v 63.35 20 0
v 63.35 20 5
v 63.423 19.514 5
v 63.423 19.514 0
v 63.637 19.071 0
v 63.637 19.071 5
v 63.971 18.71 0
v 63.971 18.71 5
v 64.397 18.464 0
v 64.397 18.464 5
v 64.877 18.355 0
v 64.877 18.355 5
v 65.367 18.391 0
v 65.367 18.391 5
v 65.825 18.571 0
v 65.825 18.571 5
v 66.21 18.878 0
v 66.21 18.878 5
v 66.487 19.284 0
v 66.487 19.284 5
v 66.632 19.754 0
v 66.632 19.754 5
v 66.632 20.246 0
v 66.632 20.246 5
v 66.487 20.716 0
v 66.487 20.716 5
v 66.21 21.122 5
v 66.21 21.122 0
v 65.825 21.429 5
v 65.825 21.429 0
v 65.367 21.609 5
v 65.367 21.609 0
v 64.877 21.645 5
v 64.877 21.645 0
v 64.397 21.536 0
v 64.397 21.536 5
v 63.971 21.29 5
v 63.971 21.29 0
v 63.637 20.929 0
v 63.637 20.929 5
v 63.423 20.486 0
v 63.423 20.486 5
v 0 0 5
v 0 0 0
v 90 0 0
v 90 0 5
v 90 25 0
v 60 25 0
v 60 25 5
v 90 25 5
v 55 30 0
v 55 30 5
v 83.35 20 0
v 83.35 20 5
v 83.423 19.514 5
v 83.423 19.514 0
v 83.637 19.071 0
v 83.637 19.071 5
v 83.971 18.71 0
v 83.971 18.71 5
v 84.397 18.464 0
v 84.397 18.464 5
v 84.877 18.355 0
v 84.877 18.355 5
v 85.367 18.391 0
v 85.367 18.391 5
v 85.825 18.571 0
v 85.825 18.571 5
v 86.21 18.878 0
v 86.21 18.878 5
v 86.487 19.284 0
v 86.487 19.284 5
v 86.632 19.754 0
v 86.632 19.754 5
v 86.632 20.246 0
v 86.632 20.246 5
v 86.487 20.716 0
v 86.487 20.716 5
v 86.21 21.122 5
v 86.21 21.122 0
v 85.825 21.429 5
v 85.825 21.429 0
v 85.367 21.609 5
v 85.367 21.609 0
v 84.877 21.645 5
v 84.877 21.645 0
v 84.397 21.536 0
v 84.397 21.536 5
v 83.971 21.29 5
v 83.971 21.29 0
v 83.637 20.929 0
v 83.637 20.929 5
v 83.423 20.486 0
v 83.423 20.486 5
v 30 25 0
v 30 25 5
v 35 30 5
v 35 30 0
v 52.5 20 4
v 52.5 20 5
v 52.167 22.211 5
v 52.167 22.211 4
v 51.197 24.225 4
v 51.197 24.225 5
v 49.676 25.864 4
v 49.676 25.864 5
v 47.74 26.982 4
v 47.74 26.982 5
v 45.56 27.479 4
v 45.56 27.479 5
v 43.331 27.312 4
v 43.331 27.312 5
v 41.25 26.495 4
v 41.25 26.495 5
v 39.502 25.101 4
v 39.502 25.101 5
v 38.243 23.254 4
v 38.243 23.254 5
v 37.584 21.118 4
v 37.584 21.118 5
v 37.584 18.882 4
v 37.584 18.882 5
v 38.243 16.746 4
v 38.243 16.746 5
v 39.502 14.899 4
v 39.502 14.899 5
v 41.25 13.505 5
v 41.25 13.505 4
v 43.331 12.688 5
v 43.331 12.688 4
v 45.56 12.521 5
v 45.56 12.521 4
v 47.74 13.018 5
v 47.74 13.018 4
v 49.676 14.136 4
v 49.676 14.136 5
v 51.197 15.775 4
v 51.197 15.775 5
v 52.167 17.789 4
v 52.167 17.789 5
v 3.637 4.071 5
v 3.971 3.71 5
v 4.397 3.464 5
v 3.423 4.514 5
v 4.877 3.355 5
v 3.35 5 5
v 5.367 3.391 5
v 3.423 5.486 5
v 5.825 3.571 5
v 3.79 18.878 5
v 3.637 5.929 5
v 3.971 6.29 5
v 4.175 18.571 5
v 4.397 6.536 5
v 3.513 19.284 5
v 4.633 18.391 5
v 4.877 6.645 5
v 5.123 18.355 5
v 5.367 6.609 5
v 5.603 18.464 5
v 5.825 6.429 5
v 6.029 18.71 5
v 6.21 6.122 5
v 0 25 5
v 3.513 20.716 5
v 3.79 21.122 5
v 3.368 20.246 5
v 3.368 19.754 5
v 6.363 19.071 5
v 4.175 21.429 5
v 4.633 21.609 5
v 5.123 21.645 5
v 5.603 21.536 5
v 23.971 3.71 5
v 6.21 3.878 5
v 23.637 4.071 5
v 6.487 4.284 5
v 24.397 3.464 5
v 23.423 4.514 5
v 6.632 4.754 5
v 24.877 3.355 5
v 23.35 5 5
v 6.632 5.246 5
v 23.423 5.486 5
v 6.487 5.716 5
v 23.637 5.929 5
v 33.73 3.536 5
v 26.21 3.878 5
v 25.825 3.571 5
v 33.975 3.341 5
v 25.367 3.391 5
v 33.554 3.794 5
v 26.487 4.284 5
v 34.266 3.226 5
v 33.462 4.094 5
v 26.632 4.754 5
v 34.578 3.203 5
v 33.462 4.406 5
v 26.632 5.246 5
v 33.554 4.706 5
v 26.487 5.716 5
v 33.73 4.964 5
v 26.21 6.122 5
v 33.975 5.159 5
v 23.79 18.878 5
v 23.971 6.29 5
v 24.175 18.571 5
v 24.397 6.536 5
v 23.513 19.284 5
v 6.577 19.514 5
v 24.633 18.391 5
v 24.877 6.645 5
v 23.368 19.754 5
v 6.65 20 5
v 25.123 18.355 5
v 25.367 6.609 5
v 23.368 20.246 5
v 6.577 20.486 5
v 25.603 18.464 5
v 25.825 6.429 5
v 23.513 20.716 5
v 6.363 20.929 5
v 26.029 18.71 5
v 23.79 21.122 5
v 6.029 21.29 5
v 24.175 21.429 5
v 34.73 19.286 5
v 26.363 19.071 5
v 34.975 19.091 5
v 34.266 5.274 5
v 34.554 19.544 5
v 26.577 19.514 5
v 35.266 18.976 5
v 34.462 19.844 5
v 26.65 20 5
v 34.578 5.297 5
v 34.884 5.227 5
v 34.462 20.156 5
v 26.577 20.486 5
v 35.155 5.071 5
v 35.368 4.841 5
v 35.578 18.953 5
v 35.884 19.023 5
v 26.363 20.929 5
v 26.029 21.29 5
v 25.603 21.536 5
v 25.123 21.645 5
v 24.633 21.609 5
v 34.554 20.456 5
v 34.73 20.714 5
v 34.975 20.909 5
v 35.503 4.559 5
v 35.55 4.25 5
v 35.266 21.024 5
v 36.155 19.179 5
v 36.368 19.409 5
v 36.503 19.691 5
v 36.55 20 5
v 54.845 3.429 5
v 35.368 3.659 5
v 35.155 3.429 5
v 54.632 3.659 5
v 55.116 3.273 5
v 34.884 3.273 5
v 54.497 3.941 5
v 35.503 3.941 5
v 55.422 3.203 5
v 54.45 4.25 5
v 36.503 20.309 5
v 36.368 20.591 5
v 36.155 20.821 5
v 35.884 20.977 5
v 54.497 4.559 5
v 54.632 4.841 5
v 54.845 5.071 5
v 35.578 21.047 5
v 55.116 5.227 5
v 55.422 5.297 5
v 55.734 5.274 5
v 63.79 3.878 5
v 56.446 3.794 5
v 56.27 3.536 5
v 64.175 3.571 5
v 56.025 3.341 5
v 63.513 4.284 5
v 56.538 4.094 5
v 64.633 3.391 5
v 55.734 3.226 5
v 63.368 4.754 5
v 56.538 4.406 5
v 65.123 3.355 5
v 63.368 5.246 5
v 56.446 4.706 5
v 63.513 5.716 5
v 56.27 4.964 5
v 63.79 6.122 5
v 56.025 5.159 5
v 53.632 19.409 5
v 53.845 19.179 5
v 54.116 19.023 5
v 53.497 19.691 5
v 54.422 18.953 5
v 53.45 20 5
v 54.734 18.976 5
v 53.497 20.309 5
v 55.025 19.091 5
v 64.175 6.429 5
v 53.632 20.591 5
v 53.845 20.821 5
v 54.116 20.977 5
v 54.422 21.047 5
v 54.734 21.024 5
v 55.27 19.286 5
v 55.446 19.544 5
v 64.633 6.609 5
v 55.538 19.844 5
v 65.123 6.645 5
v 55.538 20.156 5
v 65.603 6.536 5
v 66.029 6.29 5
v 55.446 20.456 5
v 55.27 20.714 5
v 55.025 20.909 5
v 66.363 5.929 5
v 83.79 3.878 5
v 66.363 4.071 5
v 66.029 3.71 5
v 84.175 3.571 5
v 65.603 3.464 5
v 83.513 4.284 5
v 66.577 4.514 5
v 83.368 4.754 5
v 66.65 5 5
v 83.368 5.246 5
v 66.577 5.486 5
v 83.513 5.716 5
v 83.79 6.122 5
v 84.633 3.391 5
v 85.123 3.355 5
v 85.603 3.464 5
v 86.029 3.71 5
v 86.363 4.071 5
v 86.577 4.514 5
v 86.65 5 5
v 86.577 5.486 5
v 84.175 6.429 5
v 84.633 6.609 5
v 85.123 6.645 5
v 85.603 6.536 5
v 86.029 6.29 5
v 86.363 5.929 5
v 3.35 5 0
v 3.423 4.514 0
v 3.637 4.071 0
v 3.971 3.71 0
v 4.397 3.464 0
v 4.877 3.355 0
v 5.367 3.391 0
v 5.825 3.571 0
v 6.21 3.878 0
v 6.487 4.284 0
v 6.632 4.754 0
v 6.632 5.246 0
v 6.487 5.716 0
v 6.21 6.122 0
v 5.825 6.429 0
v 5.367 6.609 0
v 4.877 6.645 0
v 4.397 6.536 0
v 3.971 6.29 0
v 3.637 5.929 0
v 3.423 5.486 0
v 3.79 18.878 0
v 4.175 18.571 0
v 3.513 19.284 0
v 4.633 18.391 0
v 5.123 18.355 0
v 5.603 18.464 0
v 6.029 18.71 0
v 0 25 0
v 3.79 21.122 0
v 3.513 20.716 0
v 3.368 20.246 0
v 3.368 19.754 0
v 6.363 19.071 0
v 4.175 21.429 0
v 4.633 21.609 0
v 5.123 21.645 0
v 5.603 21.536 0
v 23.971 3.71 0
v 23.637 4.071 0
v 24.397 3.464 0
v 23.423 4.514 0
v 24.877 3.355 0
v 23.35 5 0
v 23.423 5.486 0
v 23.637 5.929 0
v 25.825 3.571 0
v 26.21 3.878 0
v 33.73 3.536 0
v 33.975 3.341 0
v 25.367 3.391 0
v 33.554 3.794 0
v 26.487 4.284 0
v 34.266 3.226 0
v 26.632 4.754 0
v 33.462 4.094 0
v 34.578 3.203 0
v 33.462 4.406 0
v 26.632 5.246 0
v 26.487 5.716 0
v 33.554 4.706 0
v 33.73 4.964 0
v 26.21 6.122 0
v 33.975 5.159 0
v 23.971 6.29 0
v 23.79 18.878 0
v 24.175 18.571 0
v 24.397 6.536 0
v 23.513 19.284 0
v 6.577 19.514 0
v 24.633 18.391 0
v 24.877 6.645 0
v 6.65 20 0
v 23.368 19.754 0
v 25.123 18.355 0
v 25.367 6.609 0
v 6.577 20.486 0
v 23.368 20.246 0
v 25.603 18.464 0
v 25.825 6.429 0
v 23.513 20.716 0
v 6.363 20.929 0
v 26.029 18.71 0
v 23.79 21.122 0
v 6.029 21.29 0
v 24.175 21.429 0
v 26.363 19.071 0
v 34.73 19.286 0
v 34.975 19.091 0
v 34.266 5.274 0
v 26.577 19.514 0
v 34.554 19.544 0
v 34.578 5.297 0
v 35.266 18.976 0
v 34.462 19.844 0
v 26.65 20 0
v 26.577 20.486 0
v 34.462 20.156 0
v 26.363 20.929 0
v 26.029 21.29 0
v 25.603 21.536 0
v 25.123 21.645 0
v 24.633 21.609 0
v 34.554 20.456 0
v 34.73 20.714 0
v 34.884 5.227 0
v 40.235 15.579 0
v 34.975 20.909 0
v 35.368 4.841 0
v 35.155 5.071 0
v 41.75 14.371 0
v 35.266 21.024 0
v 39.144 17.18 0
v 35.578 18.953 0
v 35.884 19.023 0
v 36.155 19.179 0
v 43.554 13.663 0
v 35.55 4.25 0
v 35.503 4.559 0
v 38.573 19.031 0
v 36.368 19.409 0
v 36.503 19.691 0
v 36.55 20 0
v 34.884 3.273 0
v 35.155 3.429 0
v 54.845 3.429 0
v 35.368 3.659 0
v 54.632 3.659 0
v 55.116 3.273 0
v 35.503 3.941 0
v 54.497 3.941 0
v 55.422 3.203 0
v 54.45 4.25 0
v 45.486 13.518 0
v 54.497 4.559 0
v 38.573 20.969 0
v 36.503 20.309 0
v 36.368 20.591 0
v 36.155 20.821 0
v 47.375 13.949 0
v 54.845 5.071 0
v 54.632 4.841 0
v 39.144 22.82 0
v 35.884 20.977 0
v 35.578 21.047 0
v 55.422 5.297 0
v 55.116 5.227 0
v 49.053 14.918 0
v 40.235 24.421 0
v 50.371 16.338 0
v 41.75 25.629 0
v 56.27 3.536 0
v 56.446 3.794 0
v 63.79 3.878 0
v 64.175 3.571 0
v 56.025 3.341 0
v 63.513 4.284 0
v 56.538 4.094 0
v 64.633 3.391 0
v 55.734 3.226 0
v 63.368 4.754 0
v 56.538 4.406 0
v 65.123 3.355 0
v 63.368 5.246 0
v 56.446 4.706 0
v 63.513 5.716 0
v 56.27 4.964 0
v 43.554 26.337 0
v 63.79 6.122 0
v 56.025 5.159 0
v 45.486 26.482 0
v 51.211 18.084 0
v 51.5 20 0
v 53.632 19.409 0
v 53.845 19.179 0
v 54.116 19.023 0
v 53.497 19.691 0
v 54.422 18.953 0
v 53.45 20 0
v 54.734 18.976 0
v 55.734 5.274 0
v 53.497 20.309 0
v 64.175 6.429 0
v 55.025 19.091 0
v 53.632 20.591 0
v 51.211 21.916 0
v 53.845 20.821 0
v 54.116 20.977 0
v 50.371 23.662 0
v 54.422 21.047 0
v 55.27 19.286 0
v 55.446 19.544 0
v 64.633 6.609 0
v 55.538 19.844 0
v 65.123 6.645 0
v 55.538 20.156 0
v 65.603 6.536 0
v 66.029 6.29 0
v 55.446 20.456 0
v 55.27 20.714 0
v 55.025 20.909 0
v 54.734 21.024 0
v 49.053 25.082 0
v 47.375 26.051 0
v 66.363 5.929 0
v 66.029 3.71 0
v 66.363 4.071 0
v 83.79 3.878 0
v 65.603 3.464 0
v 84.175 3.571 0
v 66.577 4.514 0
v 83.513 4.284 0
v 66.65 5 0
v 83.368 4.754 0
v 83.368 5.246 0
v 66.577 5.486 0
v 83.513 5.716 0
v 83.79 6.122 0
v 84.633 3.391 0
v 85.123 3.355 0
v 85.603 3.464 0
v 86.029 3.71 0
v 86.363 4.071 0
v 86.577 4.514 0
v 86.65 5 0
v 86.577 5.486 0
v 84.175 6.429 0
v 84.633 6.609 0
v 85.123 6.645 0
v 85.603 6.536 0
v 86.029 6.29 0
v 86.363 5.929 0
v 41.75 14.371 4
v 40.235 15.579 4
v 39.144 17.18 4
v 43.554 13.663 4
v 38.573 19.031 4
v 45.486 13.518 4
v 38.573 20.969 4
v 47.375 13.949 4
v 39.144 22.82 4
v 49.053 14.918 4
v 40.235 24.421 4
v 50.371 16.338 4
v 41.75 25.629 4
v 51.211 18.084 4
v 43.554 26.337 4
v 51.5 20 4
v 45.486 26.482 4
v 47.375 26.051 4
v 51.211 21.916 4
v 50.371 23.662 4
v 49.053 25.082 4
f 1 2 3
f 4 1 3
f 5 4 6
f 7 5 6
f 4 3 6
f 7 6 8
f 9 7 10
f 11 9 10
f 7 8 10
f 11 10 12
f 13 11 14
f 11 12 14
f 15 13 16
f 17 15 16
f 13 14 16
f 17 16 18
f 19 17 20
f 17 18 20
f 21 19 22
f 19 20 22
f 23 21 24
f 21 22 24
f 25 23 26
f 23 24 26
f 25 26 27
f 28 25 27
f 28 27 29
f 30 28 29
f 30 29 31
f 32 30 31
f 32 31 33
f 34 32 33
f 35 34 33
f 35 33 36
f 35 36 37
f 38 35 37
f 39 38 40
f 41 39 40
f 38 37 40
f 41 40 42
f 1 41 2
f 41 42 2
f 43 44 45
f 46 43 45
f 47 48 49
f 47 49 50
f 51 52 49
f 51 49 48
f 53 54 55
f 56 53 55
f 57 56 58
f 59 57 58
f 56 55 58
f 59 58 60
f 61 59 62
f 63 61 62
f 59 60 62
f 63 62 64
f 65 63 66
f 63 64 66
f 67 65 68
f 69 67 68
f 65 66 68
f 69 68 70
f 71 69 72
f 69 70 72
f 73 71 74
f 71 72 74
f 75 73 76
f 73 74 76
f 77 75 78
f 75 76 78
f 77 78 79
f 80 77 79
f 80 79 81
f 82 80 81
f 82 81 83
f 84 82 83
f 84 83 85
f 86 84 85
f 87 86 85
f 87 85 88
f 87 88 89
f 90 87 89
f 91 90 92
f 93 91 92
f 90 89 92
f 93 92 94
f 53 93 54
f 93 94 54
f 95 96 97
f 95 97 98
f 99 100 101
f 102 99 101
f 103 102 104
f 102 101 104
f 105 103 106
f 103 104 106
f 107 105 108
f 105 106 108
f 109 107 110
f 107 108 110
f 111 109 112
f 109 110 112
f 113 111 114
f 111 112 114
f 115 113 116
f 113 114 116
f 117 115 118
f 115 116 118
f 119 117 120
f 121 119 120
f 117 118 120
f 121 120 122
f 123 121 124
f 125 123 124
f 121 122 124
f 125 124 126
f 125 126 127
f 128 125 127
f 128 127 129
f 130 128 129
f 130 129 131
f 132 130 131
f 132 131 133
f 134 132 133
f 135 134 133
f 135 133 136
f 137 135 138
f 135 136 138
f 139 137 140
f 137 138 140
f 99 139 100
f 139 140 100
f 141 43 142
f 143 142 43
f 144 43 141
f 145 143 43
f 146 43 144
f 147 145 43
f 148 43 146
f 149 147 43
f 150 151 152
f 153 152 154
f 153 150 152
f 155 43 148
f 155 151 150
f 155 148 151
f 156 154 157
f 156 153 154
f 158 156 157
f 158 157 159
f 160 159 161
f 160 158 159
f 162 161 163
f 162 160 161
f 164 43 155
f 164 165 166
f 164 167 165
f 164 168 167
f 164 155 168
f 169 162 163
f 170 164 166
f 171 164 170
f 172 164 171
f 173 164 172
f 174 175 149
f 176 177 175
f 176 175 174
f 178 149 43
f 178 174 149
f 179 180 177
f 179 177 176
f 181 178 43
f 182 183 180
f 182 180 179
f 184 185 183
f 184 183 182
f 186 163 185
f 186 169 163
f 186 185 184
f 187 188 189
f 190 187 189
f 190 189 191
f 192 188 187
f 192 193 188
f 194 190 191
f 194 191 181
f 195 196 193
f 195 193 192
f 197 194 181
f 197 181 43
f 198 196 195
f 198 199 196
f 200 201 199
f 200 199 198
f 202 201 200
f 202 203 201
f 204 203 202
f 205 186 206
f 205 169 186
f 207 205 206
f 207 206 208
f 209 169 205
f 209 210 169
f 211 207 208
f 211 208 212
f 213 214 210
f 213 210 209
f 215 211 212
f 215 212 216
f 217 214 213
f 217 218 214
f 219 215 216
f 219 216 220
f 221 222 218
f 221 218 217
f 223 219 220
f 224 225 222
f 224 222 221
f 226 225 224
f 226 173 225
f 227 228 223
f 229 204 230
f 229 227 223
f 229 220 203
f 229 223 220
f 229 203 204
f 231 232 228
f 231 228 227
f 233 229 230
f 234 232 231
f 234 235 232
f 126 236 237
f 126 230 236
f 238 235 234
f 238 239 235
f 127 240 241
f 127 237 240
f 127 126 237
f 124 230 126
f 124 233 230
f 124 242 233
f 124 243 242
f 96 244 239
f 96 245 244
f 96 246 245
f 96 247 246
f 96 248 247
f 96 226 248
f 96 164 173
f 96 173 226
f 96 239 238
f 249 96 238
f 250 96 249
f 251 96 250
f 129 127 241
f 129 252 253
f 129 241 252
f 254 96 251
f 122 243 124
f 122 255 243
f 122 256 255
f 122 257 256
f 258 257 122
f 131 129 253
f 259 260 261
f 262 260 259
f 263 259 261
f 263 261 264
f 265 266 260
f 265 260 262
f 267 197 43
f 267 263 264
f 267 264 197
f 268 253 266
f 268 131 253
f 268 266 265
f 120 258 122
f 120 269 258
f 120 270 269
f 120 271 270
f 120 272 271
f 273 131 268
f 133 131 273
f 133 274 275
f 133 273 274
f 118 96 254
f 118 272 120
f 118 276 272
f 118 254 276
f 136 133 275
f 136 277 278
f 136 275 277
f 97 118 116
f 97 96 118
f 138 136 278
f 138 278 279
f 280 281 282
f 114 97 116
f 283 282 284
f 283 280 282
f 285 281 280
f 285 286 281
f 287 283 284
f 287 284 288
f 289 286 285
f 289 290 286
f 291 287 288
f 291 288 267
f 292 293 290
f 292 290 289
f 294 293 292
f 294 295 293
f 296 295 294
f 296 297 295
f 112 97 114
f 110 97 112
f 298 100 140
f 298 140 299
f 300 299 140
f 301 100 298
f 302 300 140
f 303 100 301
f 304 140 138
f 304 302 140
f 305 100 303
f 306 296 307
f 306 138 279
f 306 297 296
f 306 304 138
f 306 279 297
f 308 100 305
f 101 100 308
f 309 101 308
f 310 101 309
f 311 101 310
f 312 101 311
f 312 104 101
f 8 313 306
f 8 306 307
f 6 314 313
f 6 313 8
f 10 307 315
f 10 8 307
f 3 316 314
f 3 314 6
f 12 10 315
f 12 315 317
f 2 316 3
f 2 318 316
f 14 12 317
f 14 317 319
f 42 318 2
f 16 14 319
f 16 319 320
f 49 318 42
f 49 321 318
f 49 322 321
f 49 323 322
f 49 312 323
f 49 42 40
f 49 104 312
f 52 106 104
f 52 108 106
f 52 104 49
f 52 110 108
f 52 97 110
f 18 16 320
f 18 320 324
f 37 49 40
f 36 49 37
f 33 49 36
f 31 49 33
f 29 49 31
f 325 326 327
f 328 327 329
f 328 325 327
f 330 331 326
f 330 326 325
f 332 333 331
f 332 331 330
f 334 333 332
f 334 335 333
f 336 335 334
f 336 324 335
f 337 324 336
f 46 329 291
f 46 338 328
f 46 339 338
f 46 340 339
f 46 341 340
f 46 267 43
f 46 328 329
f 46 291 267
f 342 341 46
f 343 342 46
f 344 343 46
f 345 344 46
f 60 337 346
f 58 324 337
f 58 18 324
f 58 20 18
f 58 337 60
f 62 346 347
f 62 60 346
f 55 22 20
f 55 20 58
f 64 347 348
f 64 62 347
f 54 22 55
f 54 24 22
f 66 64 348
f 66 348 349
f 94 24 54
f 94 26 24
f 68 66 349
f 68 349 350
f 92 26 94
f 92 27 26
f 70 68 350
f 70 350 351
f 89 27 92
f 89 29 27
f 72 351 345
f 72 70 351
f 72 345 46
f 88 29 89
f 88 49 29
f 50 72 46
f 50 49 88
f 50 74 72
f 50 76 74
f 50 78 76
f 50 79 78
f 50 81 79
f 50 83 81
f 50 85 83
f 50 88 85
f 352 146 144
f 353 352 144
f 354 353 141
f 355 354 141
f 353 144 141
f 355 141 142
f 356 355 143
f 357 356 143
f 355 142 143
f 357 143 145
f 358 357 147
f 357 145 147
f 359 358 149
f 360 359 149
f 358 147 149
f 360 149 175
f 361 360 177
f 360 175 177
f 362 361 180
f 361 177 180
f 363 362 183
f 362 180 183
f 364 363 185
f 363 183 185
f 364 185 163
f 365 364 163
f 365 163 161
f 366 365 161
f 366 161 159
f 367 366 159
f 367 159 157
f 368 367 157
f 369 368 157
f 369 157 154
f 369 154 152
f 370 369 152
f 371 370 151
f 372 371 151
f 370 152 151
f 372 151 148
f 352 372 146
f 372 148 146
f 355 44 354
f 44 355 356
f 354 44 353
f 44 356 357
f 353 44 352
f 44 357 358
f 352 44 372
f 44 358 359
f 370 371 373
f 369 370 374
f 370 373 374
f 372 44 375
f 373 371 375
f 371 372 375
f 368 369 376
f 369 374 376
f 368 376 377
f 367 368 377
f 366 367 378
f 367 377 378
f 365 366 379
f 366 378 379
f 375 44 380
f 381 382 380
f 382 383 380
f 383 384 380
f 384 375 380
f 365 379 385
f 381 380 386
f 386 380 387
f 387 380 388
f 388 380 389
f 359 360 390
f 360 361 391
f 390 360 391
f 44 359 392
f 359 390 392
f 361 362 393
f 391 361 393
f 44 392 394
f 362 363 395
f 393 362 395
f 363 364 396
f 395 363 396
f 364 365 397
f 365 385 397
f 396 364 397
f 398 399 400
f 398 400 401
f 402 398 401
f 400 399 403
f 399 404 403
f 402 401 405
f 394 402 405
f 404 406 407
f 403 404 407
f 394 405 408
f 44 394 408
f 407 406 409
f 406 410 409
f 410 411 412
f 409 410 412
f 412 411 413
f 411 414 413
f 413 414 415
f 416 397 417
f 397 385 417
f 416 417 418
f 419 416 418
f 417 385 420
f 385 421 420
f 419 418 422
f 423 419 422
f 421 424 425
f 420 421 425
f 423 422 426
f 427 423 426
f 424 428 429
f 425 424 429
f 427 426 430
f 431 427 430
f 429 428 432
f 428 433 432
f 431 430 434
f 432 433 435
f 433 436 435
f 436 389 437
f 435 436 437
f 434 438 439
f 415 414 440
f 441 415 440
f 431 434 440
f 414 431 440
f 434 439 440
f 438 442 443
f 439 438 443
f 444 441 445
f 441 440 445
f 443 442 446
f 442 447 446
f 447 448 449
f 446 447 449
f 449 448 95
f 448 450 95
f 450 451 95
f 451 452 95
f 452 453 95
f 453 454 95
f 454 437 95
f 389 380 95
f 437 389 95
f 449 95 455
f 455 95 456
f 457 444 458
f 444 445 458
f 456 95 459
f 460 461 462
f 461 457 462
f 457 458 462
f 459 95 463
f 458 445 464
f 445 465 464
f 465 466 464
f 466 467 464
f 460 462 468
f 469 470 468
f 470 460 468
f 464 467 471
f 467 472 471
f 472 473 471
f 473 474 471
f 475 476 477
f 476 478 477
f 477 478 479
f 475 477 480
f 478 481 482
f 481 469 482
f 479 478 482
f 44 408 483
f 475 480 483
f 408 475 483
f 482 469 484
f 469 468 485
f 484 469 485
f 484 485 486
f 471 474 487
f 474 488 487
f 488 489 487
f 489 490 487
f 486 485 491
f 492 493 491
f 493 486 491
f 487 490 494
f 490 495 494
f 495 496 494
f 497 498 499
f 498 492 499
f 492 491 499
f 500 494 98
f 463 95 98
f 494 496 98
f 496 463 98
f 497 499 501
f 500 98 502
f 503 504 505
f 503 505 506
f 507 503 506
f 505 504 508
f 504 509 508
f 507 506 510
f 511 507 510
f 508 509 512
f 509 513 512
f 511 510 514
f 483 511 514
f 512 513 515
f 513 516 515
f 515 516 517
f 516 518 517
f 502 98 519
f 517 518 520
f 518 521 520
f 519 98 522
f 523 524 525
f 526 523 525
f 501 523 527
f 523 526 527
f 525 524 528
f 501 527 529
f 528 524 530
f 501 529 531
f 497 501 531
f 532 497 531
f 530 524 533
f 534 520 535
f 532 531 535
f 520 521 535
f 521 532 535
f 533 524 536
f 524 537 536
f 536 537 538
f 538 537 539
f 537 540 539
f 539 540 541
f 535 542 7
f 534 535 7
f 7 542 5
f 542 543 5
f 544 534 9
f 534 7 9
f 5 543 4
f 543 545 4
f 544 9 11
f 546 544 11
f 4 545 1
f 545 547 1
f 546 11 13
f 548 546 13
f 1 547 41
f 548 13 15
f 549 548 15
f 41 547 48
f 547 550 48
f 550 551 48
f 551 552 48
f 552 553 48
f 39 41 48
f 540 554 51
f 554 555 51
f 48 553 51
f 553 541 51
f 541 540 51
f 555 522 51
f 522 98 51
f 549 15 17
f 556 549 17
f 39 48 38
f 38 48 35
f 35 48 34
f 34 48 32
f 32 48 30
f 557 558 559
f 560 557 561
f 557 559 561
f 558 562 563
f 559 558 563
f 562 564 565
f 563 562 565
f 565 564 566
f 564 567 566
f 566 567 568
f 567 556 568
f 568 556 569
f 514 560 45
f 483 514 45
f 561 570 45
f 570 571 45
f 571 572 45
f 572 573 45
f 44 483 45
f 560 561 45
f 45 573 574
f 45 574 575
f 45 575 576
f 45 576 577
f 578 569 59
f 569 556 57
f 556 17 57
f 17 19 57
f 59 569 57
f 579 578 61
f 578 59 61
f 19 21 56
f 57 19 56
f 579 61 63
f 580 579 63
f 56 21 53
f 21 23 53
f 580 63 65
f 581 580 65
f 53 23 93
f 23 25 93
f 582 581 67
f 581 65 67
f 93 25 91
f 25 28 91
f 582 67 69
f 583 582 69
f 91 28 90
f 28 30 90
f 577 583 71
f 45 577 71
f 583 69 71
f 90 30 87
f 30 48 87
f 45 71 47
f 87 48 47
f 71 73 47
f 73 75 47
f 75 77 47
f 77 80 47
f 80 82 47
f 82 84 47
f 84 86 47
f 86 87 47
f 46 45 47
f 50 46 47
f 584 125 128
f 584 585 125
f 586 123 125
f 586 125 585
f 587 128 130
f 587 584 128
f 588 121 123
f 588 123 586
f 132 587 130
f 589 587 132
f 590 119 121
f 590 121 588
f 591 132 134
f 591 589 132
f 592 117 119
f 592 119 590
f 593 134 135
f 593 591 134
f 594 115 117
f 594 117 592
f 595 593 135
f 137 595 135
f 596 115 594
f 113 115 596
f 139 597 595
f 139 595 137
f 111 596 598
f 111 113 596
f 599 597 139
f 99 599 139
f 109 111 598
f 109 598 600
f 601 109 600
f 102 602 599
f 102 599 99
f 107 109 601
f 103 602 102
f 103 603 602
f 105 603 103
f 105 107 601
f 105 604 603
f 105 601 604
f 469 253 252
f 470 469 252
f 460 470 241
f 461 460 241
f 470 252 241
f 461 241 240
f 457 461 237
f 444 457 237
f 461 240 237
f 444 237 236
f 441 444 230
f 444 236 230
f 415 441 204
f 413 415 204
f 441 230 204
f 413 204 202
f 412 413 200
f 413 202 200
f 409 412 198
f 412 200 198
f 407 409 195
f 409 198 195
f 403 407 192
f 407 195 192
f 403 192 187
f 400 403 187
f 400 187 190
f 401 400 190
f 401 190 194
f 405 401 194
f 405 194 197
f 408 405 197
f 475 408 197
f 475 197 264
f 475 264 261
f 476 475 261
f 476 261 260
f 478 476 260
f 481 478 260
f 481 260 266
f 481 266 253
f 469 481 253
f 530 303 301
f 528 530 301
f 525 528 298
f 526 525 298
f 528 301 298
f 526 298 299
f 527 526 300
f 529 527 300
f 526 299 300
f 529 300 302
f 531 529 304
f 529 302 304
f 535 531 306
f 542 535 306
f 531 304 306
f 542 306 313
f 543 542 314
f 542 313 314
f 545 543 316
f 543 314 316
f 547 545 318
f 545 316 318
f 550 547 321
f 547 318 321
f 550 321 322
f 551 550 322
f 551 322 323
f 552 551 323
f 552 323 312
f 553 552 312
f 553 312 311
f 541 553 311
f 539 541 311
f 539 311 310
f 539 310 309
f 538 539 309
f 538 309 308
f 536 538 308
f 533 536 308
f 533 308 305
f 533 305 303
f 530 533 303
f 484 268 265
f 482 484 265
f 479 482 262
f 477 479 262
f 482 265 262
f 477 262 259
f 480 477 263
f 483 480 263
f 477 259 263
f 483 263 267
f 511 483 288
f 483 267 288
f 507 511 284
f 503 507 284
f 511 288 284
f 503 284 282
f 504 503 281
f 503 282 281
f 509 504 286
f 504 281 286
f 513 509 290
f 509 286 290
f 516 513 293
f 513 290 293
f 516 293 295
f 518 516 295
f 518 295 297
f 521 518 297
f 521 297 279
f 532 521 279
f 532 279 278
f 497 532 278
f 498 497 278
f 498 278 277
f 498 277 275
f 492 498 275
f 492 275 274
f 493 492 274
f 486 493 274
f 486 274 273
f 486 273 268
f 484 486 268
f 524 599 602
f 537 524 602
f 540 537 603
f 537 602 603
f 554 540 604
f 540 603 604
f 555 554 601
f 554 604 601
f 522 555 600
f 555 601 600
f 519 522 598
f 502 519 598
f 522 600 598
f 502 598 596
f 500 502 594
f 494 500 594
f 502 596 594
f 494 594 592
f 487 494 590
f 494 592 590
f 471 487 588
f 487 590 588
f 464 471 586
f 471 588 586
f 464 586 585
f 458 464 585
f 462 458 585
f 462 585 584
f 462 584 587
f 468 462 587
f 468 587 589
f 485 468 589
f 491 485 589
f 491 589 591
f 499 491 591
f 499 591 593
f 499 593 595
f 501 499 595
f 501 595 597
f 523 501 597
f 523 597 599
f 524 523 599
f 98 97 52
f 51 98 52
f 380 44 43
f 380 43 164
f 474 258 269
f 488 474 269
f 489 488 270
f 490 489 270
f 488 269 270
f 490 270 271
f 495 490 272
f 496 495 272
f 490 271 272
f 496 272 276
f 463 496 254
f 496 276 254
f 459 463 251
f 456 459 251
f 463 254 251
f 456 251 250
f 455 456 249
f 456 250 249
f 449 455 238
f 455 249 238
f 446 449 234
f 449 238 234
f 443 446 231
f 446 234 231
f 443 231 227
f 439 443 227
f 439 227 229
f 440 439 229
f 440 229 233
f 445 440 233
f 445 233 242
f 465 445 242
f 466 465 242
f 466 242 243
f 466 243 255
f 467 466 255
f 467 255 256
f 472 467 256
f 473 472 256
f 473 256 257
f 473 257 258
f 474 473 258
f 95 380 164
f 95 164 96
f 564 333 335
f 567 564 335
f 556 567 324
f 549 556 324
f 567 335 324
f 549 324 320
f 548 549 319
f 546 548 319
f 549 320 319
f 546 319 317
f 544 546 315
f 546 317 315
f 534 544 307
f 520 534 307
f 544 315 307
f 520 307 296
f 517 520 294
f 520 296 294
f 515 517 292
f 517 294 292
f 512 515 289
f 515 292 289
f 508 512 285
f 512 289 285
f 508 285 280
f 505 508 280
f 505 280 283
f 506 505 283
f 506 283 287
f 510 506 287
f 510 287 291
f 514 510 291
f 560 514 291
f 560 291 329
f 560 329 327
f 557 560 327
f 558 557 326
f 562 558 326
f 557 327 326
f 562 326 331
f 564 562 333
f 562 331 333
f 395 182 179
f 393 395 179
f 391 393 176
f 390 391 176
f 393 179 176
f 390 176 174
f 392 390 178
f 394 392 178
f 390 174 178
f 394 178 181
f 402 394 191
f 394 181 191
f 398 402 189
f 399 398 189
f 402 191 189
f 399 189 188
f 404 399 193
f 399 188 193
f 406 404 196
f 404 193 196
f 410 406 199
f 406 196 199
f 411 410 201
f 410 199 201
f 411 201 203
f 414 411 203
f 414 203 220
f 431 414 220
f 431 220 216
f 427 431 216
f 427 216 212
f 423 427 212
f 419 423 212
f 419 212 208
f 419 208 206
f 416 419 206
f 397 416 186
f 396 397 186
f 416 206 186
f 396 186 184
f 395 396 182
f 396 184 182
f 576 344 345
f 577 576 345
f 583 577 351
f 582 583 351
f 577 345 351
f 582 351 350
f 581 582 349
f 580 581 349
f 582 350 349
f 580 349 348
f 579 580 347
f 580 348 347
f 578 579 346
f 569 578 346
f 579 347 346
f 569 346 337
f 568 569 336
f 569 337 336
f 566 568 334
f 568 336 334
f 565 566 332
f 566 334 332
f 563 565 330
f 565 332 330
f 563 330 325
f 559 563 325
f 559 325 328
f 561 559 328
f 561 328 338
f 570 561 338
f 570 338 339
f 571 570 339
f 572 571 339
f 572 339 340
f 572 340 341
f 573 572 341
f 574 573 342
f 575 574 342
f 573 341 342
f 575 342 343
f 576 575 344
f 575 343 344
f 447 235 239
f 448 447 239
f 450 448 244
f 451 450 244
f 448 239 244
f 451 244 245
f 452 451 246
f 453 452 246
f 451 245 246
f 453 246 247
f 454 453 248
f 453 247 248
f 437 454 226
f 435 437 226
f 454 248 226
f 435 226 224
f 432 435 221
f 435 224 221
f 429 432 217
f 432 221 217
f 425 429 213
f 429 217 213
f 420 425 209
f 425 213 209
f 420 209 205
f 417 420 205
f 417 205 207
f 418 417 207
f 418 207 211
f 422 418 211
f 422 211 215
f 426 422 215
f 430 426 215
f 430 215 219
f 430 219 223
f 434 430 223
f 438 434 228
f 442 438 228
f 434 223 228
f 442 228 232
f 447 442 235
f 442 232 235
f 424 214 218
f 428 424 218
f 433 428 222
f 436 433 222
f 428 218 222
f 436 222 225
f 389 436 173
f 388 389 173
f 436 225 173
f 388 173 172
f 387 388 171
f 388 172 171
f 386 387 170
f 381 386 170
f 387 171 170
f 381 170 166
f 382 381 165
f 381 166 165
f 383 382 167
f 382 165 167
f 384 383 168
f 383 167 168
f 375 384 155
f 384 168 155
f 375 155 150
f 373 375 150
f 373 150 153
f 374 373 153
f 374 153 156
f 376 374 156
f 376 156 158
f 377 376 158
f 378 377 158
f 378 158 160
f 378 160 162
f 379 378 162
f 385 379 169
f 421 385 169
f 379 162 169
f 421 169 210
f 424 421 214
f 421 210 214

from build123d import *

# Parameters (mm, degrees)
ESQUISSE1_W             = 90
ESQUISSE1_H             = 25
BOSS_EXTRU_1_DEPTH      = 5
ESQUISSE6_W             = 20
ESQUISSE6_H             = 5
BOSS_EXTRU_2_DEPTH      = 5
ESQUISSE3_R             = 6.5
ENL_V_MAT_EXTRU_2_DEPTH = 96
ESQUISSE4_R             = 1.05
ENL_V_MAT_EXTRU_3_DEPTH = 96
ESQUISSE5_R             = 1.65
ENL_V_MAT_EXTRU_4_DEPTH = 5
CHANFREIN1_SIZE         = 5
ESQUISSE7_R             = 7.5
ENL_V_MAT_EXTRU_5_DEPTH = 1


with BuildPart() as part:
    # Esquisse1 → Boss.-Extru.1 (new body)
    with BuildSketch(Plane.XY):
        with Locations((45, 12.5)):
            Rectangle(ESQUISSE1_W, ESQUISSE1_H)
    extrude(amount=BOSS_EXTRU_1_DEPTH)

    # Esquisse6 → Boss.-Extru.2 (add)
    with BuildSketch(Plane.XY.offset(5)):
        with Locations((45, 27.5)):
            Rectangle(ESQUISSE6_W, ESQUISSE6_H)
    extrude(amount=-BOSS_EXTRU_2_DEPTH)

    # Esquisse3 → Enlèv. mat.-Extru.2 (cut, through all)
    with BuildSketch(Plane.XY.offset(5)):
        with Locations((45, 20)):
            Circle(ESQUISSE3_R)
    extrude(amount=-ENL_V_MAT_EXTRU_2_DEPTH, mode=Mode.SUBTRACT)

    # Esquisse4 → Enlèv. mat.-Extru.3 (cut, through all)
    with BuildSketch(Plane.XY.offset(5)):
        with Locations((34.5, 4.25)):
            Circle(ESQUISSE4_R)
        with Locations(Location((54.5, 20, 0), (0, 0, 180))):
            Circle(ESQUISSE4_R)
        with Locations(Location((55.5, 4.25, 0), (0, 0, 180))):
            Circle(ESQUISSE4_R)
        with Locations((35.5, 20)):
            Circle(ESQUISSE4_R)
    extrude(amount=-ENL_V_MAT_EXTRU_3_DEPTH, mode=Mode.SUBTRACT)

    # Esquisse5 → Enlèv. mat.-Extru.4 (cut)
    with BuildSketch(Plane.XY.offset(5)):
        with Locations((5, 20)):
            Circle(ESQUISSE5_R)
        with Locations((25, 20)):
            Circle(ESQUISSE5_R)
        with Locations(Location((25, 5, 0), (0, 0, 180))):
            Circle(ESQUISSE5_R)
        with Locations(Location((5, 5, 0), (0, 0, 180))):
            Circle(ESQUISSE5_R)
        with Locations((85, 5)):
            Circle(ESQUISSE5_R)
        with Locations((65, 5)):
            Circle(ESQUISSE5_R)
        with Locations(Location((65, 20, 0), (0, 0, 180))):
            Circle(ESQUISSE5_R)
        with Locations(Location((85, 20, 0), (0, 0, 180))):
            Circle(ESQUISSE5_R)
    extrude(amount=-ENL_V_MAT_EXTRU_4_DEPTH, mode=Mode.SUBTRACT)

    # Chanfrein1
    chanfrein1_edges = [part.edges().sort_by_distance(p)[0] for p in [
        (55, 25, 2.5),
        (35, 25, 2.5),
    ]]
    chamfer(chanfrein1_edges, length=CHANFREIN1_SIZE - 0.0001)  # a hair under: the kernel refuses the full size

    # Esquisse7 → Enlèv. mat.-Extru.5 (cut)
    with BuildSketch(Plane.XY.offset(5)):
        with Locations((45, 20)):
            Circle(ESQUISSE7_R)
    extrude(amount=-ENL_V_MAT_EXTRU_5_DEPTH, mode=Mode.SUBTRACT)


solid = part.part
